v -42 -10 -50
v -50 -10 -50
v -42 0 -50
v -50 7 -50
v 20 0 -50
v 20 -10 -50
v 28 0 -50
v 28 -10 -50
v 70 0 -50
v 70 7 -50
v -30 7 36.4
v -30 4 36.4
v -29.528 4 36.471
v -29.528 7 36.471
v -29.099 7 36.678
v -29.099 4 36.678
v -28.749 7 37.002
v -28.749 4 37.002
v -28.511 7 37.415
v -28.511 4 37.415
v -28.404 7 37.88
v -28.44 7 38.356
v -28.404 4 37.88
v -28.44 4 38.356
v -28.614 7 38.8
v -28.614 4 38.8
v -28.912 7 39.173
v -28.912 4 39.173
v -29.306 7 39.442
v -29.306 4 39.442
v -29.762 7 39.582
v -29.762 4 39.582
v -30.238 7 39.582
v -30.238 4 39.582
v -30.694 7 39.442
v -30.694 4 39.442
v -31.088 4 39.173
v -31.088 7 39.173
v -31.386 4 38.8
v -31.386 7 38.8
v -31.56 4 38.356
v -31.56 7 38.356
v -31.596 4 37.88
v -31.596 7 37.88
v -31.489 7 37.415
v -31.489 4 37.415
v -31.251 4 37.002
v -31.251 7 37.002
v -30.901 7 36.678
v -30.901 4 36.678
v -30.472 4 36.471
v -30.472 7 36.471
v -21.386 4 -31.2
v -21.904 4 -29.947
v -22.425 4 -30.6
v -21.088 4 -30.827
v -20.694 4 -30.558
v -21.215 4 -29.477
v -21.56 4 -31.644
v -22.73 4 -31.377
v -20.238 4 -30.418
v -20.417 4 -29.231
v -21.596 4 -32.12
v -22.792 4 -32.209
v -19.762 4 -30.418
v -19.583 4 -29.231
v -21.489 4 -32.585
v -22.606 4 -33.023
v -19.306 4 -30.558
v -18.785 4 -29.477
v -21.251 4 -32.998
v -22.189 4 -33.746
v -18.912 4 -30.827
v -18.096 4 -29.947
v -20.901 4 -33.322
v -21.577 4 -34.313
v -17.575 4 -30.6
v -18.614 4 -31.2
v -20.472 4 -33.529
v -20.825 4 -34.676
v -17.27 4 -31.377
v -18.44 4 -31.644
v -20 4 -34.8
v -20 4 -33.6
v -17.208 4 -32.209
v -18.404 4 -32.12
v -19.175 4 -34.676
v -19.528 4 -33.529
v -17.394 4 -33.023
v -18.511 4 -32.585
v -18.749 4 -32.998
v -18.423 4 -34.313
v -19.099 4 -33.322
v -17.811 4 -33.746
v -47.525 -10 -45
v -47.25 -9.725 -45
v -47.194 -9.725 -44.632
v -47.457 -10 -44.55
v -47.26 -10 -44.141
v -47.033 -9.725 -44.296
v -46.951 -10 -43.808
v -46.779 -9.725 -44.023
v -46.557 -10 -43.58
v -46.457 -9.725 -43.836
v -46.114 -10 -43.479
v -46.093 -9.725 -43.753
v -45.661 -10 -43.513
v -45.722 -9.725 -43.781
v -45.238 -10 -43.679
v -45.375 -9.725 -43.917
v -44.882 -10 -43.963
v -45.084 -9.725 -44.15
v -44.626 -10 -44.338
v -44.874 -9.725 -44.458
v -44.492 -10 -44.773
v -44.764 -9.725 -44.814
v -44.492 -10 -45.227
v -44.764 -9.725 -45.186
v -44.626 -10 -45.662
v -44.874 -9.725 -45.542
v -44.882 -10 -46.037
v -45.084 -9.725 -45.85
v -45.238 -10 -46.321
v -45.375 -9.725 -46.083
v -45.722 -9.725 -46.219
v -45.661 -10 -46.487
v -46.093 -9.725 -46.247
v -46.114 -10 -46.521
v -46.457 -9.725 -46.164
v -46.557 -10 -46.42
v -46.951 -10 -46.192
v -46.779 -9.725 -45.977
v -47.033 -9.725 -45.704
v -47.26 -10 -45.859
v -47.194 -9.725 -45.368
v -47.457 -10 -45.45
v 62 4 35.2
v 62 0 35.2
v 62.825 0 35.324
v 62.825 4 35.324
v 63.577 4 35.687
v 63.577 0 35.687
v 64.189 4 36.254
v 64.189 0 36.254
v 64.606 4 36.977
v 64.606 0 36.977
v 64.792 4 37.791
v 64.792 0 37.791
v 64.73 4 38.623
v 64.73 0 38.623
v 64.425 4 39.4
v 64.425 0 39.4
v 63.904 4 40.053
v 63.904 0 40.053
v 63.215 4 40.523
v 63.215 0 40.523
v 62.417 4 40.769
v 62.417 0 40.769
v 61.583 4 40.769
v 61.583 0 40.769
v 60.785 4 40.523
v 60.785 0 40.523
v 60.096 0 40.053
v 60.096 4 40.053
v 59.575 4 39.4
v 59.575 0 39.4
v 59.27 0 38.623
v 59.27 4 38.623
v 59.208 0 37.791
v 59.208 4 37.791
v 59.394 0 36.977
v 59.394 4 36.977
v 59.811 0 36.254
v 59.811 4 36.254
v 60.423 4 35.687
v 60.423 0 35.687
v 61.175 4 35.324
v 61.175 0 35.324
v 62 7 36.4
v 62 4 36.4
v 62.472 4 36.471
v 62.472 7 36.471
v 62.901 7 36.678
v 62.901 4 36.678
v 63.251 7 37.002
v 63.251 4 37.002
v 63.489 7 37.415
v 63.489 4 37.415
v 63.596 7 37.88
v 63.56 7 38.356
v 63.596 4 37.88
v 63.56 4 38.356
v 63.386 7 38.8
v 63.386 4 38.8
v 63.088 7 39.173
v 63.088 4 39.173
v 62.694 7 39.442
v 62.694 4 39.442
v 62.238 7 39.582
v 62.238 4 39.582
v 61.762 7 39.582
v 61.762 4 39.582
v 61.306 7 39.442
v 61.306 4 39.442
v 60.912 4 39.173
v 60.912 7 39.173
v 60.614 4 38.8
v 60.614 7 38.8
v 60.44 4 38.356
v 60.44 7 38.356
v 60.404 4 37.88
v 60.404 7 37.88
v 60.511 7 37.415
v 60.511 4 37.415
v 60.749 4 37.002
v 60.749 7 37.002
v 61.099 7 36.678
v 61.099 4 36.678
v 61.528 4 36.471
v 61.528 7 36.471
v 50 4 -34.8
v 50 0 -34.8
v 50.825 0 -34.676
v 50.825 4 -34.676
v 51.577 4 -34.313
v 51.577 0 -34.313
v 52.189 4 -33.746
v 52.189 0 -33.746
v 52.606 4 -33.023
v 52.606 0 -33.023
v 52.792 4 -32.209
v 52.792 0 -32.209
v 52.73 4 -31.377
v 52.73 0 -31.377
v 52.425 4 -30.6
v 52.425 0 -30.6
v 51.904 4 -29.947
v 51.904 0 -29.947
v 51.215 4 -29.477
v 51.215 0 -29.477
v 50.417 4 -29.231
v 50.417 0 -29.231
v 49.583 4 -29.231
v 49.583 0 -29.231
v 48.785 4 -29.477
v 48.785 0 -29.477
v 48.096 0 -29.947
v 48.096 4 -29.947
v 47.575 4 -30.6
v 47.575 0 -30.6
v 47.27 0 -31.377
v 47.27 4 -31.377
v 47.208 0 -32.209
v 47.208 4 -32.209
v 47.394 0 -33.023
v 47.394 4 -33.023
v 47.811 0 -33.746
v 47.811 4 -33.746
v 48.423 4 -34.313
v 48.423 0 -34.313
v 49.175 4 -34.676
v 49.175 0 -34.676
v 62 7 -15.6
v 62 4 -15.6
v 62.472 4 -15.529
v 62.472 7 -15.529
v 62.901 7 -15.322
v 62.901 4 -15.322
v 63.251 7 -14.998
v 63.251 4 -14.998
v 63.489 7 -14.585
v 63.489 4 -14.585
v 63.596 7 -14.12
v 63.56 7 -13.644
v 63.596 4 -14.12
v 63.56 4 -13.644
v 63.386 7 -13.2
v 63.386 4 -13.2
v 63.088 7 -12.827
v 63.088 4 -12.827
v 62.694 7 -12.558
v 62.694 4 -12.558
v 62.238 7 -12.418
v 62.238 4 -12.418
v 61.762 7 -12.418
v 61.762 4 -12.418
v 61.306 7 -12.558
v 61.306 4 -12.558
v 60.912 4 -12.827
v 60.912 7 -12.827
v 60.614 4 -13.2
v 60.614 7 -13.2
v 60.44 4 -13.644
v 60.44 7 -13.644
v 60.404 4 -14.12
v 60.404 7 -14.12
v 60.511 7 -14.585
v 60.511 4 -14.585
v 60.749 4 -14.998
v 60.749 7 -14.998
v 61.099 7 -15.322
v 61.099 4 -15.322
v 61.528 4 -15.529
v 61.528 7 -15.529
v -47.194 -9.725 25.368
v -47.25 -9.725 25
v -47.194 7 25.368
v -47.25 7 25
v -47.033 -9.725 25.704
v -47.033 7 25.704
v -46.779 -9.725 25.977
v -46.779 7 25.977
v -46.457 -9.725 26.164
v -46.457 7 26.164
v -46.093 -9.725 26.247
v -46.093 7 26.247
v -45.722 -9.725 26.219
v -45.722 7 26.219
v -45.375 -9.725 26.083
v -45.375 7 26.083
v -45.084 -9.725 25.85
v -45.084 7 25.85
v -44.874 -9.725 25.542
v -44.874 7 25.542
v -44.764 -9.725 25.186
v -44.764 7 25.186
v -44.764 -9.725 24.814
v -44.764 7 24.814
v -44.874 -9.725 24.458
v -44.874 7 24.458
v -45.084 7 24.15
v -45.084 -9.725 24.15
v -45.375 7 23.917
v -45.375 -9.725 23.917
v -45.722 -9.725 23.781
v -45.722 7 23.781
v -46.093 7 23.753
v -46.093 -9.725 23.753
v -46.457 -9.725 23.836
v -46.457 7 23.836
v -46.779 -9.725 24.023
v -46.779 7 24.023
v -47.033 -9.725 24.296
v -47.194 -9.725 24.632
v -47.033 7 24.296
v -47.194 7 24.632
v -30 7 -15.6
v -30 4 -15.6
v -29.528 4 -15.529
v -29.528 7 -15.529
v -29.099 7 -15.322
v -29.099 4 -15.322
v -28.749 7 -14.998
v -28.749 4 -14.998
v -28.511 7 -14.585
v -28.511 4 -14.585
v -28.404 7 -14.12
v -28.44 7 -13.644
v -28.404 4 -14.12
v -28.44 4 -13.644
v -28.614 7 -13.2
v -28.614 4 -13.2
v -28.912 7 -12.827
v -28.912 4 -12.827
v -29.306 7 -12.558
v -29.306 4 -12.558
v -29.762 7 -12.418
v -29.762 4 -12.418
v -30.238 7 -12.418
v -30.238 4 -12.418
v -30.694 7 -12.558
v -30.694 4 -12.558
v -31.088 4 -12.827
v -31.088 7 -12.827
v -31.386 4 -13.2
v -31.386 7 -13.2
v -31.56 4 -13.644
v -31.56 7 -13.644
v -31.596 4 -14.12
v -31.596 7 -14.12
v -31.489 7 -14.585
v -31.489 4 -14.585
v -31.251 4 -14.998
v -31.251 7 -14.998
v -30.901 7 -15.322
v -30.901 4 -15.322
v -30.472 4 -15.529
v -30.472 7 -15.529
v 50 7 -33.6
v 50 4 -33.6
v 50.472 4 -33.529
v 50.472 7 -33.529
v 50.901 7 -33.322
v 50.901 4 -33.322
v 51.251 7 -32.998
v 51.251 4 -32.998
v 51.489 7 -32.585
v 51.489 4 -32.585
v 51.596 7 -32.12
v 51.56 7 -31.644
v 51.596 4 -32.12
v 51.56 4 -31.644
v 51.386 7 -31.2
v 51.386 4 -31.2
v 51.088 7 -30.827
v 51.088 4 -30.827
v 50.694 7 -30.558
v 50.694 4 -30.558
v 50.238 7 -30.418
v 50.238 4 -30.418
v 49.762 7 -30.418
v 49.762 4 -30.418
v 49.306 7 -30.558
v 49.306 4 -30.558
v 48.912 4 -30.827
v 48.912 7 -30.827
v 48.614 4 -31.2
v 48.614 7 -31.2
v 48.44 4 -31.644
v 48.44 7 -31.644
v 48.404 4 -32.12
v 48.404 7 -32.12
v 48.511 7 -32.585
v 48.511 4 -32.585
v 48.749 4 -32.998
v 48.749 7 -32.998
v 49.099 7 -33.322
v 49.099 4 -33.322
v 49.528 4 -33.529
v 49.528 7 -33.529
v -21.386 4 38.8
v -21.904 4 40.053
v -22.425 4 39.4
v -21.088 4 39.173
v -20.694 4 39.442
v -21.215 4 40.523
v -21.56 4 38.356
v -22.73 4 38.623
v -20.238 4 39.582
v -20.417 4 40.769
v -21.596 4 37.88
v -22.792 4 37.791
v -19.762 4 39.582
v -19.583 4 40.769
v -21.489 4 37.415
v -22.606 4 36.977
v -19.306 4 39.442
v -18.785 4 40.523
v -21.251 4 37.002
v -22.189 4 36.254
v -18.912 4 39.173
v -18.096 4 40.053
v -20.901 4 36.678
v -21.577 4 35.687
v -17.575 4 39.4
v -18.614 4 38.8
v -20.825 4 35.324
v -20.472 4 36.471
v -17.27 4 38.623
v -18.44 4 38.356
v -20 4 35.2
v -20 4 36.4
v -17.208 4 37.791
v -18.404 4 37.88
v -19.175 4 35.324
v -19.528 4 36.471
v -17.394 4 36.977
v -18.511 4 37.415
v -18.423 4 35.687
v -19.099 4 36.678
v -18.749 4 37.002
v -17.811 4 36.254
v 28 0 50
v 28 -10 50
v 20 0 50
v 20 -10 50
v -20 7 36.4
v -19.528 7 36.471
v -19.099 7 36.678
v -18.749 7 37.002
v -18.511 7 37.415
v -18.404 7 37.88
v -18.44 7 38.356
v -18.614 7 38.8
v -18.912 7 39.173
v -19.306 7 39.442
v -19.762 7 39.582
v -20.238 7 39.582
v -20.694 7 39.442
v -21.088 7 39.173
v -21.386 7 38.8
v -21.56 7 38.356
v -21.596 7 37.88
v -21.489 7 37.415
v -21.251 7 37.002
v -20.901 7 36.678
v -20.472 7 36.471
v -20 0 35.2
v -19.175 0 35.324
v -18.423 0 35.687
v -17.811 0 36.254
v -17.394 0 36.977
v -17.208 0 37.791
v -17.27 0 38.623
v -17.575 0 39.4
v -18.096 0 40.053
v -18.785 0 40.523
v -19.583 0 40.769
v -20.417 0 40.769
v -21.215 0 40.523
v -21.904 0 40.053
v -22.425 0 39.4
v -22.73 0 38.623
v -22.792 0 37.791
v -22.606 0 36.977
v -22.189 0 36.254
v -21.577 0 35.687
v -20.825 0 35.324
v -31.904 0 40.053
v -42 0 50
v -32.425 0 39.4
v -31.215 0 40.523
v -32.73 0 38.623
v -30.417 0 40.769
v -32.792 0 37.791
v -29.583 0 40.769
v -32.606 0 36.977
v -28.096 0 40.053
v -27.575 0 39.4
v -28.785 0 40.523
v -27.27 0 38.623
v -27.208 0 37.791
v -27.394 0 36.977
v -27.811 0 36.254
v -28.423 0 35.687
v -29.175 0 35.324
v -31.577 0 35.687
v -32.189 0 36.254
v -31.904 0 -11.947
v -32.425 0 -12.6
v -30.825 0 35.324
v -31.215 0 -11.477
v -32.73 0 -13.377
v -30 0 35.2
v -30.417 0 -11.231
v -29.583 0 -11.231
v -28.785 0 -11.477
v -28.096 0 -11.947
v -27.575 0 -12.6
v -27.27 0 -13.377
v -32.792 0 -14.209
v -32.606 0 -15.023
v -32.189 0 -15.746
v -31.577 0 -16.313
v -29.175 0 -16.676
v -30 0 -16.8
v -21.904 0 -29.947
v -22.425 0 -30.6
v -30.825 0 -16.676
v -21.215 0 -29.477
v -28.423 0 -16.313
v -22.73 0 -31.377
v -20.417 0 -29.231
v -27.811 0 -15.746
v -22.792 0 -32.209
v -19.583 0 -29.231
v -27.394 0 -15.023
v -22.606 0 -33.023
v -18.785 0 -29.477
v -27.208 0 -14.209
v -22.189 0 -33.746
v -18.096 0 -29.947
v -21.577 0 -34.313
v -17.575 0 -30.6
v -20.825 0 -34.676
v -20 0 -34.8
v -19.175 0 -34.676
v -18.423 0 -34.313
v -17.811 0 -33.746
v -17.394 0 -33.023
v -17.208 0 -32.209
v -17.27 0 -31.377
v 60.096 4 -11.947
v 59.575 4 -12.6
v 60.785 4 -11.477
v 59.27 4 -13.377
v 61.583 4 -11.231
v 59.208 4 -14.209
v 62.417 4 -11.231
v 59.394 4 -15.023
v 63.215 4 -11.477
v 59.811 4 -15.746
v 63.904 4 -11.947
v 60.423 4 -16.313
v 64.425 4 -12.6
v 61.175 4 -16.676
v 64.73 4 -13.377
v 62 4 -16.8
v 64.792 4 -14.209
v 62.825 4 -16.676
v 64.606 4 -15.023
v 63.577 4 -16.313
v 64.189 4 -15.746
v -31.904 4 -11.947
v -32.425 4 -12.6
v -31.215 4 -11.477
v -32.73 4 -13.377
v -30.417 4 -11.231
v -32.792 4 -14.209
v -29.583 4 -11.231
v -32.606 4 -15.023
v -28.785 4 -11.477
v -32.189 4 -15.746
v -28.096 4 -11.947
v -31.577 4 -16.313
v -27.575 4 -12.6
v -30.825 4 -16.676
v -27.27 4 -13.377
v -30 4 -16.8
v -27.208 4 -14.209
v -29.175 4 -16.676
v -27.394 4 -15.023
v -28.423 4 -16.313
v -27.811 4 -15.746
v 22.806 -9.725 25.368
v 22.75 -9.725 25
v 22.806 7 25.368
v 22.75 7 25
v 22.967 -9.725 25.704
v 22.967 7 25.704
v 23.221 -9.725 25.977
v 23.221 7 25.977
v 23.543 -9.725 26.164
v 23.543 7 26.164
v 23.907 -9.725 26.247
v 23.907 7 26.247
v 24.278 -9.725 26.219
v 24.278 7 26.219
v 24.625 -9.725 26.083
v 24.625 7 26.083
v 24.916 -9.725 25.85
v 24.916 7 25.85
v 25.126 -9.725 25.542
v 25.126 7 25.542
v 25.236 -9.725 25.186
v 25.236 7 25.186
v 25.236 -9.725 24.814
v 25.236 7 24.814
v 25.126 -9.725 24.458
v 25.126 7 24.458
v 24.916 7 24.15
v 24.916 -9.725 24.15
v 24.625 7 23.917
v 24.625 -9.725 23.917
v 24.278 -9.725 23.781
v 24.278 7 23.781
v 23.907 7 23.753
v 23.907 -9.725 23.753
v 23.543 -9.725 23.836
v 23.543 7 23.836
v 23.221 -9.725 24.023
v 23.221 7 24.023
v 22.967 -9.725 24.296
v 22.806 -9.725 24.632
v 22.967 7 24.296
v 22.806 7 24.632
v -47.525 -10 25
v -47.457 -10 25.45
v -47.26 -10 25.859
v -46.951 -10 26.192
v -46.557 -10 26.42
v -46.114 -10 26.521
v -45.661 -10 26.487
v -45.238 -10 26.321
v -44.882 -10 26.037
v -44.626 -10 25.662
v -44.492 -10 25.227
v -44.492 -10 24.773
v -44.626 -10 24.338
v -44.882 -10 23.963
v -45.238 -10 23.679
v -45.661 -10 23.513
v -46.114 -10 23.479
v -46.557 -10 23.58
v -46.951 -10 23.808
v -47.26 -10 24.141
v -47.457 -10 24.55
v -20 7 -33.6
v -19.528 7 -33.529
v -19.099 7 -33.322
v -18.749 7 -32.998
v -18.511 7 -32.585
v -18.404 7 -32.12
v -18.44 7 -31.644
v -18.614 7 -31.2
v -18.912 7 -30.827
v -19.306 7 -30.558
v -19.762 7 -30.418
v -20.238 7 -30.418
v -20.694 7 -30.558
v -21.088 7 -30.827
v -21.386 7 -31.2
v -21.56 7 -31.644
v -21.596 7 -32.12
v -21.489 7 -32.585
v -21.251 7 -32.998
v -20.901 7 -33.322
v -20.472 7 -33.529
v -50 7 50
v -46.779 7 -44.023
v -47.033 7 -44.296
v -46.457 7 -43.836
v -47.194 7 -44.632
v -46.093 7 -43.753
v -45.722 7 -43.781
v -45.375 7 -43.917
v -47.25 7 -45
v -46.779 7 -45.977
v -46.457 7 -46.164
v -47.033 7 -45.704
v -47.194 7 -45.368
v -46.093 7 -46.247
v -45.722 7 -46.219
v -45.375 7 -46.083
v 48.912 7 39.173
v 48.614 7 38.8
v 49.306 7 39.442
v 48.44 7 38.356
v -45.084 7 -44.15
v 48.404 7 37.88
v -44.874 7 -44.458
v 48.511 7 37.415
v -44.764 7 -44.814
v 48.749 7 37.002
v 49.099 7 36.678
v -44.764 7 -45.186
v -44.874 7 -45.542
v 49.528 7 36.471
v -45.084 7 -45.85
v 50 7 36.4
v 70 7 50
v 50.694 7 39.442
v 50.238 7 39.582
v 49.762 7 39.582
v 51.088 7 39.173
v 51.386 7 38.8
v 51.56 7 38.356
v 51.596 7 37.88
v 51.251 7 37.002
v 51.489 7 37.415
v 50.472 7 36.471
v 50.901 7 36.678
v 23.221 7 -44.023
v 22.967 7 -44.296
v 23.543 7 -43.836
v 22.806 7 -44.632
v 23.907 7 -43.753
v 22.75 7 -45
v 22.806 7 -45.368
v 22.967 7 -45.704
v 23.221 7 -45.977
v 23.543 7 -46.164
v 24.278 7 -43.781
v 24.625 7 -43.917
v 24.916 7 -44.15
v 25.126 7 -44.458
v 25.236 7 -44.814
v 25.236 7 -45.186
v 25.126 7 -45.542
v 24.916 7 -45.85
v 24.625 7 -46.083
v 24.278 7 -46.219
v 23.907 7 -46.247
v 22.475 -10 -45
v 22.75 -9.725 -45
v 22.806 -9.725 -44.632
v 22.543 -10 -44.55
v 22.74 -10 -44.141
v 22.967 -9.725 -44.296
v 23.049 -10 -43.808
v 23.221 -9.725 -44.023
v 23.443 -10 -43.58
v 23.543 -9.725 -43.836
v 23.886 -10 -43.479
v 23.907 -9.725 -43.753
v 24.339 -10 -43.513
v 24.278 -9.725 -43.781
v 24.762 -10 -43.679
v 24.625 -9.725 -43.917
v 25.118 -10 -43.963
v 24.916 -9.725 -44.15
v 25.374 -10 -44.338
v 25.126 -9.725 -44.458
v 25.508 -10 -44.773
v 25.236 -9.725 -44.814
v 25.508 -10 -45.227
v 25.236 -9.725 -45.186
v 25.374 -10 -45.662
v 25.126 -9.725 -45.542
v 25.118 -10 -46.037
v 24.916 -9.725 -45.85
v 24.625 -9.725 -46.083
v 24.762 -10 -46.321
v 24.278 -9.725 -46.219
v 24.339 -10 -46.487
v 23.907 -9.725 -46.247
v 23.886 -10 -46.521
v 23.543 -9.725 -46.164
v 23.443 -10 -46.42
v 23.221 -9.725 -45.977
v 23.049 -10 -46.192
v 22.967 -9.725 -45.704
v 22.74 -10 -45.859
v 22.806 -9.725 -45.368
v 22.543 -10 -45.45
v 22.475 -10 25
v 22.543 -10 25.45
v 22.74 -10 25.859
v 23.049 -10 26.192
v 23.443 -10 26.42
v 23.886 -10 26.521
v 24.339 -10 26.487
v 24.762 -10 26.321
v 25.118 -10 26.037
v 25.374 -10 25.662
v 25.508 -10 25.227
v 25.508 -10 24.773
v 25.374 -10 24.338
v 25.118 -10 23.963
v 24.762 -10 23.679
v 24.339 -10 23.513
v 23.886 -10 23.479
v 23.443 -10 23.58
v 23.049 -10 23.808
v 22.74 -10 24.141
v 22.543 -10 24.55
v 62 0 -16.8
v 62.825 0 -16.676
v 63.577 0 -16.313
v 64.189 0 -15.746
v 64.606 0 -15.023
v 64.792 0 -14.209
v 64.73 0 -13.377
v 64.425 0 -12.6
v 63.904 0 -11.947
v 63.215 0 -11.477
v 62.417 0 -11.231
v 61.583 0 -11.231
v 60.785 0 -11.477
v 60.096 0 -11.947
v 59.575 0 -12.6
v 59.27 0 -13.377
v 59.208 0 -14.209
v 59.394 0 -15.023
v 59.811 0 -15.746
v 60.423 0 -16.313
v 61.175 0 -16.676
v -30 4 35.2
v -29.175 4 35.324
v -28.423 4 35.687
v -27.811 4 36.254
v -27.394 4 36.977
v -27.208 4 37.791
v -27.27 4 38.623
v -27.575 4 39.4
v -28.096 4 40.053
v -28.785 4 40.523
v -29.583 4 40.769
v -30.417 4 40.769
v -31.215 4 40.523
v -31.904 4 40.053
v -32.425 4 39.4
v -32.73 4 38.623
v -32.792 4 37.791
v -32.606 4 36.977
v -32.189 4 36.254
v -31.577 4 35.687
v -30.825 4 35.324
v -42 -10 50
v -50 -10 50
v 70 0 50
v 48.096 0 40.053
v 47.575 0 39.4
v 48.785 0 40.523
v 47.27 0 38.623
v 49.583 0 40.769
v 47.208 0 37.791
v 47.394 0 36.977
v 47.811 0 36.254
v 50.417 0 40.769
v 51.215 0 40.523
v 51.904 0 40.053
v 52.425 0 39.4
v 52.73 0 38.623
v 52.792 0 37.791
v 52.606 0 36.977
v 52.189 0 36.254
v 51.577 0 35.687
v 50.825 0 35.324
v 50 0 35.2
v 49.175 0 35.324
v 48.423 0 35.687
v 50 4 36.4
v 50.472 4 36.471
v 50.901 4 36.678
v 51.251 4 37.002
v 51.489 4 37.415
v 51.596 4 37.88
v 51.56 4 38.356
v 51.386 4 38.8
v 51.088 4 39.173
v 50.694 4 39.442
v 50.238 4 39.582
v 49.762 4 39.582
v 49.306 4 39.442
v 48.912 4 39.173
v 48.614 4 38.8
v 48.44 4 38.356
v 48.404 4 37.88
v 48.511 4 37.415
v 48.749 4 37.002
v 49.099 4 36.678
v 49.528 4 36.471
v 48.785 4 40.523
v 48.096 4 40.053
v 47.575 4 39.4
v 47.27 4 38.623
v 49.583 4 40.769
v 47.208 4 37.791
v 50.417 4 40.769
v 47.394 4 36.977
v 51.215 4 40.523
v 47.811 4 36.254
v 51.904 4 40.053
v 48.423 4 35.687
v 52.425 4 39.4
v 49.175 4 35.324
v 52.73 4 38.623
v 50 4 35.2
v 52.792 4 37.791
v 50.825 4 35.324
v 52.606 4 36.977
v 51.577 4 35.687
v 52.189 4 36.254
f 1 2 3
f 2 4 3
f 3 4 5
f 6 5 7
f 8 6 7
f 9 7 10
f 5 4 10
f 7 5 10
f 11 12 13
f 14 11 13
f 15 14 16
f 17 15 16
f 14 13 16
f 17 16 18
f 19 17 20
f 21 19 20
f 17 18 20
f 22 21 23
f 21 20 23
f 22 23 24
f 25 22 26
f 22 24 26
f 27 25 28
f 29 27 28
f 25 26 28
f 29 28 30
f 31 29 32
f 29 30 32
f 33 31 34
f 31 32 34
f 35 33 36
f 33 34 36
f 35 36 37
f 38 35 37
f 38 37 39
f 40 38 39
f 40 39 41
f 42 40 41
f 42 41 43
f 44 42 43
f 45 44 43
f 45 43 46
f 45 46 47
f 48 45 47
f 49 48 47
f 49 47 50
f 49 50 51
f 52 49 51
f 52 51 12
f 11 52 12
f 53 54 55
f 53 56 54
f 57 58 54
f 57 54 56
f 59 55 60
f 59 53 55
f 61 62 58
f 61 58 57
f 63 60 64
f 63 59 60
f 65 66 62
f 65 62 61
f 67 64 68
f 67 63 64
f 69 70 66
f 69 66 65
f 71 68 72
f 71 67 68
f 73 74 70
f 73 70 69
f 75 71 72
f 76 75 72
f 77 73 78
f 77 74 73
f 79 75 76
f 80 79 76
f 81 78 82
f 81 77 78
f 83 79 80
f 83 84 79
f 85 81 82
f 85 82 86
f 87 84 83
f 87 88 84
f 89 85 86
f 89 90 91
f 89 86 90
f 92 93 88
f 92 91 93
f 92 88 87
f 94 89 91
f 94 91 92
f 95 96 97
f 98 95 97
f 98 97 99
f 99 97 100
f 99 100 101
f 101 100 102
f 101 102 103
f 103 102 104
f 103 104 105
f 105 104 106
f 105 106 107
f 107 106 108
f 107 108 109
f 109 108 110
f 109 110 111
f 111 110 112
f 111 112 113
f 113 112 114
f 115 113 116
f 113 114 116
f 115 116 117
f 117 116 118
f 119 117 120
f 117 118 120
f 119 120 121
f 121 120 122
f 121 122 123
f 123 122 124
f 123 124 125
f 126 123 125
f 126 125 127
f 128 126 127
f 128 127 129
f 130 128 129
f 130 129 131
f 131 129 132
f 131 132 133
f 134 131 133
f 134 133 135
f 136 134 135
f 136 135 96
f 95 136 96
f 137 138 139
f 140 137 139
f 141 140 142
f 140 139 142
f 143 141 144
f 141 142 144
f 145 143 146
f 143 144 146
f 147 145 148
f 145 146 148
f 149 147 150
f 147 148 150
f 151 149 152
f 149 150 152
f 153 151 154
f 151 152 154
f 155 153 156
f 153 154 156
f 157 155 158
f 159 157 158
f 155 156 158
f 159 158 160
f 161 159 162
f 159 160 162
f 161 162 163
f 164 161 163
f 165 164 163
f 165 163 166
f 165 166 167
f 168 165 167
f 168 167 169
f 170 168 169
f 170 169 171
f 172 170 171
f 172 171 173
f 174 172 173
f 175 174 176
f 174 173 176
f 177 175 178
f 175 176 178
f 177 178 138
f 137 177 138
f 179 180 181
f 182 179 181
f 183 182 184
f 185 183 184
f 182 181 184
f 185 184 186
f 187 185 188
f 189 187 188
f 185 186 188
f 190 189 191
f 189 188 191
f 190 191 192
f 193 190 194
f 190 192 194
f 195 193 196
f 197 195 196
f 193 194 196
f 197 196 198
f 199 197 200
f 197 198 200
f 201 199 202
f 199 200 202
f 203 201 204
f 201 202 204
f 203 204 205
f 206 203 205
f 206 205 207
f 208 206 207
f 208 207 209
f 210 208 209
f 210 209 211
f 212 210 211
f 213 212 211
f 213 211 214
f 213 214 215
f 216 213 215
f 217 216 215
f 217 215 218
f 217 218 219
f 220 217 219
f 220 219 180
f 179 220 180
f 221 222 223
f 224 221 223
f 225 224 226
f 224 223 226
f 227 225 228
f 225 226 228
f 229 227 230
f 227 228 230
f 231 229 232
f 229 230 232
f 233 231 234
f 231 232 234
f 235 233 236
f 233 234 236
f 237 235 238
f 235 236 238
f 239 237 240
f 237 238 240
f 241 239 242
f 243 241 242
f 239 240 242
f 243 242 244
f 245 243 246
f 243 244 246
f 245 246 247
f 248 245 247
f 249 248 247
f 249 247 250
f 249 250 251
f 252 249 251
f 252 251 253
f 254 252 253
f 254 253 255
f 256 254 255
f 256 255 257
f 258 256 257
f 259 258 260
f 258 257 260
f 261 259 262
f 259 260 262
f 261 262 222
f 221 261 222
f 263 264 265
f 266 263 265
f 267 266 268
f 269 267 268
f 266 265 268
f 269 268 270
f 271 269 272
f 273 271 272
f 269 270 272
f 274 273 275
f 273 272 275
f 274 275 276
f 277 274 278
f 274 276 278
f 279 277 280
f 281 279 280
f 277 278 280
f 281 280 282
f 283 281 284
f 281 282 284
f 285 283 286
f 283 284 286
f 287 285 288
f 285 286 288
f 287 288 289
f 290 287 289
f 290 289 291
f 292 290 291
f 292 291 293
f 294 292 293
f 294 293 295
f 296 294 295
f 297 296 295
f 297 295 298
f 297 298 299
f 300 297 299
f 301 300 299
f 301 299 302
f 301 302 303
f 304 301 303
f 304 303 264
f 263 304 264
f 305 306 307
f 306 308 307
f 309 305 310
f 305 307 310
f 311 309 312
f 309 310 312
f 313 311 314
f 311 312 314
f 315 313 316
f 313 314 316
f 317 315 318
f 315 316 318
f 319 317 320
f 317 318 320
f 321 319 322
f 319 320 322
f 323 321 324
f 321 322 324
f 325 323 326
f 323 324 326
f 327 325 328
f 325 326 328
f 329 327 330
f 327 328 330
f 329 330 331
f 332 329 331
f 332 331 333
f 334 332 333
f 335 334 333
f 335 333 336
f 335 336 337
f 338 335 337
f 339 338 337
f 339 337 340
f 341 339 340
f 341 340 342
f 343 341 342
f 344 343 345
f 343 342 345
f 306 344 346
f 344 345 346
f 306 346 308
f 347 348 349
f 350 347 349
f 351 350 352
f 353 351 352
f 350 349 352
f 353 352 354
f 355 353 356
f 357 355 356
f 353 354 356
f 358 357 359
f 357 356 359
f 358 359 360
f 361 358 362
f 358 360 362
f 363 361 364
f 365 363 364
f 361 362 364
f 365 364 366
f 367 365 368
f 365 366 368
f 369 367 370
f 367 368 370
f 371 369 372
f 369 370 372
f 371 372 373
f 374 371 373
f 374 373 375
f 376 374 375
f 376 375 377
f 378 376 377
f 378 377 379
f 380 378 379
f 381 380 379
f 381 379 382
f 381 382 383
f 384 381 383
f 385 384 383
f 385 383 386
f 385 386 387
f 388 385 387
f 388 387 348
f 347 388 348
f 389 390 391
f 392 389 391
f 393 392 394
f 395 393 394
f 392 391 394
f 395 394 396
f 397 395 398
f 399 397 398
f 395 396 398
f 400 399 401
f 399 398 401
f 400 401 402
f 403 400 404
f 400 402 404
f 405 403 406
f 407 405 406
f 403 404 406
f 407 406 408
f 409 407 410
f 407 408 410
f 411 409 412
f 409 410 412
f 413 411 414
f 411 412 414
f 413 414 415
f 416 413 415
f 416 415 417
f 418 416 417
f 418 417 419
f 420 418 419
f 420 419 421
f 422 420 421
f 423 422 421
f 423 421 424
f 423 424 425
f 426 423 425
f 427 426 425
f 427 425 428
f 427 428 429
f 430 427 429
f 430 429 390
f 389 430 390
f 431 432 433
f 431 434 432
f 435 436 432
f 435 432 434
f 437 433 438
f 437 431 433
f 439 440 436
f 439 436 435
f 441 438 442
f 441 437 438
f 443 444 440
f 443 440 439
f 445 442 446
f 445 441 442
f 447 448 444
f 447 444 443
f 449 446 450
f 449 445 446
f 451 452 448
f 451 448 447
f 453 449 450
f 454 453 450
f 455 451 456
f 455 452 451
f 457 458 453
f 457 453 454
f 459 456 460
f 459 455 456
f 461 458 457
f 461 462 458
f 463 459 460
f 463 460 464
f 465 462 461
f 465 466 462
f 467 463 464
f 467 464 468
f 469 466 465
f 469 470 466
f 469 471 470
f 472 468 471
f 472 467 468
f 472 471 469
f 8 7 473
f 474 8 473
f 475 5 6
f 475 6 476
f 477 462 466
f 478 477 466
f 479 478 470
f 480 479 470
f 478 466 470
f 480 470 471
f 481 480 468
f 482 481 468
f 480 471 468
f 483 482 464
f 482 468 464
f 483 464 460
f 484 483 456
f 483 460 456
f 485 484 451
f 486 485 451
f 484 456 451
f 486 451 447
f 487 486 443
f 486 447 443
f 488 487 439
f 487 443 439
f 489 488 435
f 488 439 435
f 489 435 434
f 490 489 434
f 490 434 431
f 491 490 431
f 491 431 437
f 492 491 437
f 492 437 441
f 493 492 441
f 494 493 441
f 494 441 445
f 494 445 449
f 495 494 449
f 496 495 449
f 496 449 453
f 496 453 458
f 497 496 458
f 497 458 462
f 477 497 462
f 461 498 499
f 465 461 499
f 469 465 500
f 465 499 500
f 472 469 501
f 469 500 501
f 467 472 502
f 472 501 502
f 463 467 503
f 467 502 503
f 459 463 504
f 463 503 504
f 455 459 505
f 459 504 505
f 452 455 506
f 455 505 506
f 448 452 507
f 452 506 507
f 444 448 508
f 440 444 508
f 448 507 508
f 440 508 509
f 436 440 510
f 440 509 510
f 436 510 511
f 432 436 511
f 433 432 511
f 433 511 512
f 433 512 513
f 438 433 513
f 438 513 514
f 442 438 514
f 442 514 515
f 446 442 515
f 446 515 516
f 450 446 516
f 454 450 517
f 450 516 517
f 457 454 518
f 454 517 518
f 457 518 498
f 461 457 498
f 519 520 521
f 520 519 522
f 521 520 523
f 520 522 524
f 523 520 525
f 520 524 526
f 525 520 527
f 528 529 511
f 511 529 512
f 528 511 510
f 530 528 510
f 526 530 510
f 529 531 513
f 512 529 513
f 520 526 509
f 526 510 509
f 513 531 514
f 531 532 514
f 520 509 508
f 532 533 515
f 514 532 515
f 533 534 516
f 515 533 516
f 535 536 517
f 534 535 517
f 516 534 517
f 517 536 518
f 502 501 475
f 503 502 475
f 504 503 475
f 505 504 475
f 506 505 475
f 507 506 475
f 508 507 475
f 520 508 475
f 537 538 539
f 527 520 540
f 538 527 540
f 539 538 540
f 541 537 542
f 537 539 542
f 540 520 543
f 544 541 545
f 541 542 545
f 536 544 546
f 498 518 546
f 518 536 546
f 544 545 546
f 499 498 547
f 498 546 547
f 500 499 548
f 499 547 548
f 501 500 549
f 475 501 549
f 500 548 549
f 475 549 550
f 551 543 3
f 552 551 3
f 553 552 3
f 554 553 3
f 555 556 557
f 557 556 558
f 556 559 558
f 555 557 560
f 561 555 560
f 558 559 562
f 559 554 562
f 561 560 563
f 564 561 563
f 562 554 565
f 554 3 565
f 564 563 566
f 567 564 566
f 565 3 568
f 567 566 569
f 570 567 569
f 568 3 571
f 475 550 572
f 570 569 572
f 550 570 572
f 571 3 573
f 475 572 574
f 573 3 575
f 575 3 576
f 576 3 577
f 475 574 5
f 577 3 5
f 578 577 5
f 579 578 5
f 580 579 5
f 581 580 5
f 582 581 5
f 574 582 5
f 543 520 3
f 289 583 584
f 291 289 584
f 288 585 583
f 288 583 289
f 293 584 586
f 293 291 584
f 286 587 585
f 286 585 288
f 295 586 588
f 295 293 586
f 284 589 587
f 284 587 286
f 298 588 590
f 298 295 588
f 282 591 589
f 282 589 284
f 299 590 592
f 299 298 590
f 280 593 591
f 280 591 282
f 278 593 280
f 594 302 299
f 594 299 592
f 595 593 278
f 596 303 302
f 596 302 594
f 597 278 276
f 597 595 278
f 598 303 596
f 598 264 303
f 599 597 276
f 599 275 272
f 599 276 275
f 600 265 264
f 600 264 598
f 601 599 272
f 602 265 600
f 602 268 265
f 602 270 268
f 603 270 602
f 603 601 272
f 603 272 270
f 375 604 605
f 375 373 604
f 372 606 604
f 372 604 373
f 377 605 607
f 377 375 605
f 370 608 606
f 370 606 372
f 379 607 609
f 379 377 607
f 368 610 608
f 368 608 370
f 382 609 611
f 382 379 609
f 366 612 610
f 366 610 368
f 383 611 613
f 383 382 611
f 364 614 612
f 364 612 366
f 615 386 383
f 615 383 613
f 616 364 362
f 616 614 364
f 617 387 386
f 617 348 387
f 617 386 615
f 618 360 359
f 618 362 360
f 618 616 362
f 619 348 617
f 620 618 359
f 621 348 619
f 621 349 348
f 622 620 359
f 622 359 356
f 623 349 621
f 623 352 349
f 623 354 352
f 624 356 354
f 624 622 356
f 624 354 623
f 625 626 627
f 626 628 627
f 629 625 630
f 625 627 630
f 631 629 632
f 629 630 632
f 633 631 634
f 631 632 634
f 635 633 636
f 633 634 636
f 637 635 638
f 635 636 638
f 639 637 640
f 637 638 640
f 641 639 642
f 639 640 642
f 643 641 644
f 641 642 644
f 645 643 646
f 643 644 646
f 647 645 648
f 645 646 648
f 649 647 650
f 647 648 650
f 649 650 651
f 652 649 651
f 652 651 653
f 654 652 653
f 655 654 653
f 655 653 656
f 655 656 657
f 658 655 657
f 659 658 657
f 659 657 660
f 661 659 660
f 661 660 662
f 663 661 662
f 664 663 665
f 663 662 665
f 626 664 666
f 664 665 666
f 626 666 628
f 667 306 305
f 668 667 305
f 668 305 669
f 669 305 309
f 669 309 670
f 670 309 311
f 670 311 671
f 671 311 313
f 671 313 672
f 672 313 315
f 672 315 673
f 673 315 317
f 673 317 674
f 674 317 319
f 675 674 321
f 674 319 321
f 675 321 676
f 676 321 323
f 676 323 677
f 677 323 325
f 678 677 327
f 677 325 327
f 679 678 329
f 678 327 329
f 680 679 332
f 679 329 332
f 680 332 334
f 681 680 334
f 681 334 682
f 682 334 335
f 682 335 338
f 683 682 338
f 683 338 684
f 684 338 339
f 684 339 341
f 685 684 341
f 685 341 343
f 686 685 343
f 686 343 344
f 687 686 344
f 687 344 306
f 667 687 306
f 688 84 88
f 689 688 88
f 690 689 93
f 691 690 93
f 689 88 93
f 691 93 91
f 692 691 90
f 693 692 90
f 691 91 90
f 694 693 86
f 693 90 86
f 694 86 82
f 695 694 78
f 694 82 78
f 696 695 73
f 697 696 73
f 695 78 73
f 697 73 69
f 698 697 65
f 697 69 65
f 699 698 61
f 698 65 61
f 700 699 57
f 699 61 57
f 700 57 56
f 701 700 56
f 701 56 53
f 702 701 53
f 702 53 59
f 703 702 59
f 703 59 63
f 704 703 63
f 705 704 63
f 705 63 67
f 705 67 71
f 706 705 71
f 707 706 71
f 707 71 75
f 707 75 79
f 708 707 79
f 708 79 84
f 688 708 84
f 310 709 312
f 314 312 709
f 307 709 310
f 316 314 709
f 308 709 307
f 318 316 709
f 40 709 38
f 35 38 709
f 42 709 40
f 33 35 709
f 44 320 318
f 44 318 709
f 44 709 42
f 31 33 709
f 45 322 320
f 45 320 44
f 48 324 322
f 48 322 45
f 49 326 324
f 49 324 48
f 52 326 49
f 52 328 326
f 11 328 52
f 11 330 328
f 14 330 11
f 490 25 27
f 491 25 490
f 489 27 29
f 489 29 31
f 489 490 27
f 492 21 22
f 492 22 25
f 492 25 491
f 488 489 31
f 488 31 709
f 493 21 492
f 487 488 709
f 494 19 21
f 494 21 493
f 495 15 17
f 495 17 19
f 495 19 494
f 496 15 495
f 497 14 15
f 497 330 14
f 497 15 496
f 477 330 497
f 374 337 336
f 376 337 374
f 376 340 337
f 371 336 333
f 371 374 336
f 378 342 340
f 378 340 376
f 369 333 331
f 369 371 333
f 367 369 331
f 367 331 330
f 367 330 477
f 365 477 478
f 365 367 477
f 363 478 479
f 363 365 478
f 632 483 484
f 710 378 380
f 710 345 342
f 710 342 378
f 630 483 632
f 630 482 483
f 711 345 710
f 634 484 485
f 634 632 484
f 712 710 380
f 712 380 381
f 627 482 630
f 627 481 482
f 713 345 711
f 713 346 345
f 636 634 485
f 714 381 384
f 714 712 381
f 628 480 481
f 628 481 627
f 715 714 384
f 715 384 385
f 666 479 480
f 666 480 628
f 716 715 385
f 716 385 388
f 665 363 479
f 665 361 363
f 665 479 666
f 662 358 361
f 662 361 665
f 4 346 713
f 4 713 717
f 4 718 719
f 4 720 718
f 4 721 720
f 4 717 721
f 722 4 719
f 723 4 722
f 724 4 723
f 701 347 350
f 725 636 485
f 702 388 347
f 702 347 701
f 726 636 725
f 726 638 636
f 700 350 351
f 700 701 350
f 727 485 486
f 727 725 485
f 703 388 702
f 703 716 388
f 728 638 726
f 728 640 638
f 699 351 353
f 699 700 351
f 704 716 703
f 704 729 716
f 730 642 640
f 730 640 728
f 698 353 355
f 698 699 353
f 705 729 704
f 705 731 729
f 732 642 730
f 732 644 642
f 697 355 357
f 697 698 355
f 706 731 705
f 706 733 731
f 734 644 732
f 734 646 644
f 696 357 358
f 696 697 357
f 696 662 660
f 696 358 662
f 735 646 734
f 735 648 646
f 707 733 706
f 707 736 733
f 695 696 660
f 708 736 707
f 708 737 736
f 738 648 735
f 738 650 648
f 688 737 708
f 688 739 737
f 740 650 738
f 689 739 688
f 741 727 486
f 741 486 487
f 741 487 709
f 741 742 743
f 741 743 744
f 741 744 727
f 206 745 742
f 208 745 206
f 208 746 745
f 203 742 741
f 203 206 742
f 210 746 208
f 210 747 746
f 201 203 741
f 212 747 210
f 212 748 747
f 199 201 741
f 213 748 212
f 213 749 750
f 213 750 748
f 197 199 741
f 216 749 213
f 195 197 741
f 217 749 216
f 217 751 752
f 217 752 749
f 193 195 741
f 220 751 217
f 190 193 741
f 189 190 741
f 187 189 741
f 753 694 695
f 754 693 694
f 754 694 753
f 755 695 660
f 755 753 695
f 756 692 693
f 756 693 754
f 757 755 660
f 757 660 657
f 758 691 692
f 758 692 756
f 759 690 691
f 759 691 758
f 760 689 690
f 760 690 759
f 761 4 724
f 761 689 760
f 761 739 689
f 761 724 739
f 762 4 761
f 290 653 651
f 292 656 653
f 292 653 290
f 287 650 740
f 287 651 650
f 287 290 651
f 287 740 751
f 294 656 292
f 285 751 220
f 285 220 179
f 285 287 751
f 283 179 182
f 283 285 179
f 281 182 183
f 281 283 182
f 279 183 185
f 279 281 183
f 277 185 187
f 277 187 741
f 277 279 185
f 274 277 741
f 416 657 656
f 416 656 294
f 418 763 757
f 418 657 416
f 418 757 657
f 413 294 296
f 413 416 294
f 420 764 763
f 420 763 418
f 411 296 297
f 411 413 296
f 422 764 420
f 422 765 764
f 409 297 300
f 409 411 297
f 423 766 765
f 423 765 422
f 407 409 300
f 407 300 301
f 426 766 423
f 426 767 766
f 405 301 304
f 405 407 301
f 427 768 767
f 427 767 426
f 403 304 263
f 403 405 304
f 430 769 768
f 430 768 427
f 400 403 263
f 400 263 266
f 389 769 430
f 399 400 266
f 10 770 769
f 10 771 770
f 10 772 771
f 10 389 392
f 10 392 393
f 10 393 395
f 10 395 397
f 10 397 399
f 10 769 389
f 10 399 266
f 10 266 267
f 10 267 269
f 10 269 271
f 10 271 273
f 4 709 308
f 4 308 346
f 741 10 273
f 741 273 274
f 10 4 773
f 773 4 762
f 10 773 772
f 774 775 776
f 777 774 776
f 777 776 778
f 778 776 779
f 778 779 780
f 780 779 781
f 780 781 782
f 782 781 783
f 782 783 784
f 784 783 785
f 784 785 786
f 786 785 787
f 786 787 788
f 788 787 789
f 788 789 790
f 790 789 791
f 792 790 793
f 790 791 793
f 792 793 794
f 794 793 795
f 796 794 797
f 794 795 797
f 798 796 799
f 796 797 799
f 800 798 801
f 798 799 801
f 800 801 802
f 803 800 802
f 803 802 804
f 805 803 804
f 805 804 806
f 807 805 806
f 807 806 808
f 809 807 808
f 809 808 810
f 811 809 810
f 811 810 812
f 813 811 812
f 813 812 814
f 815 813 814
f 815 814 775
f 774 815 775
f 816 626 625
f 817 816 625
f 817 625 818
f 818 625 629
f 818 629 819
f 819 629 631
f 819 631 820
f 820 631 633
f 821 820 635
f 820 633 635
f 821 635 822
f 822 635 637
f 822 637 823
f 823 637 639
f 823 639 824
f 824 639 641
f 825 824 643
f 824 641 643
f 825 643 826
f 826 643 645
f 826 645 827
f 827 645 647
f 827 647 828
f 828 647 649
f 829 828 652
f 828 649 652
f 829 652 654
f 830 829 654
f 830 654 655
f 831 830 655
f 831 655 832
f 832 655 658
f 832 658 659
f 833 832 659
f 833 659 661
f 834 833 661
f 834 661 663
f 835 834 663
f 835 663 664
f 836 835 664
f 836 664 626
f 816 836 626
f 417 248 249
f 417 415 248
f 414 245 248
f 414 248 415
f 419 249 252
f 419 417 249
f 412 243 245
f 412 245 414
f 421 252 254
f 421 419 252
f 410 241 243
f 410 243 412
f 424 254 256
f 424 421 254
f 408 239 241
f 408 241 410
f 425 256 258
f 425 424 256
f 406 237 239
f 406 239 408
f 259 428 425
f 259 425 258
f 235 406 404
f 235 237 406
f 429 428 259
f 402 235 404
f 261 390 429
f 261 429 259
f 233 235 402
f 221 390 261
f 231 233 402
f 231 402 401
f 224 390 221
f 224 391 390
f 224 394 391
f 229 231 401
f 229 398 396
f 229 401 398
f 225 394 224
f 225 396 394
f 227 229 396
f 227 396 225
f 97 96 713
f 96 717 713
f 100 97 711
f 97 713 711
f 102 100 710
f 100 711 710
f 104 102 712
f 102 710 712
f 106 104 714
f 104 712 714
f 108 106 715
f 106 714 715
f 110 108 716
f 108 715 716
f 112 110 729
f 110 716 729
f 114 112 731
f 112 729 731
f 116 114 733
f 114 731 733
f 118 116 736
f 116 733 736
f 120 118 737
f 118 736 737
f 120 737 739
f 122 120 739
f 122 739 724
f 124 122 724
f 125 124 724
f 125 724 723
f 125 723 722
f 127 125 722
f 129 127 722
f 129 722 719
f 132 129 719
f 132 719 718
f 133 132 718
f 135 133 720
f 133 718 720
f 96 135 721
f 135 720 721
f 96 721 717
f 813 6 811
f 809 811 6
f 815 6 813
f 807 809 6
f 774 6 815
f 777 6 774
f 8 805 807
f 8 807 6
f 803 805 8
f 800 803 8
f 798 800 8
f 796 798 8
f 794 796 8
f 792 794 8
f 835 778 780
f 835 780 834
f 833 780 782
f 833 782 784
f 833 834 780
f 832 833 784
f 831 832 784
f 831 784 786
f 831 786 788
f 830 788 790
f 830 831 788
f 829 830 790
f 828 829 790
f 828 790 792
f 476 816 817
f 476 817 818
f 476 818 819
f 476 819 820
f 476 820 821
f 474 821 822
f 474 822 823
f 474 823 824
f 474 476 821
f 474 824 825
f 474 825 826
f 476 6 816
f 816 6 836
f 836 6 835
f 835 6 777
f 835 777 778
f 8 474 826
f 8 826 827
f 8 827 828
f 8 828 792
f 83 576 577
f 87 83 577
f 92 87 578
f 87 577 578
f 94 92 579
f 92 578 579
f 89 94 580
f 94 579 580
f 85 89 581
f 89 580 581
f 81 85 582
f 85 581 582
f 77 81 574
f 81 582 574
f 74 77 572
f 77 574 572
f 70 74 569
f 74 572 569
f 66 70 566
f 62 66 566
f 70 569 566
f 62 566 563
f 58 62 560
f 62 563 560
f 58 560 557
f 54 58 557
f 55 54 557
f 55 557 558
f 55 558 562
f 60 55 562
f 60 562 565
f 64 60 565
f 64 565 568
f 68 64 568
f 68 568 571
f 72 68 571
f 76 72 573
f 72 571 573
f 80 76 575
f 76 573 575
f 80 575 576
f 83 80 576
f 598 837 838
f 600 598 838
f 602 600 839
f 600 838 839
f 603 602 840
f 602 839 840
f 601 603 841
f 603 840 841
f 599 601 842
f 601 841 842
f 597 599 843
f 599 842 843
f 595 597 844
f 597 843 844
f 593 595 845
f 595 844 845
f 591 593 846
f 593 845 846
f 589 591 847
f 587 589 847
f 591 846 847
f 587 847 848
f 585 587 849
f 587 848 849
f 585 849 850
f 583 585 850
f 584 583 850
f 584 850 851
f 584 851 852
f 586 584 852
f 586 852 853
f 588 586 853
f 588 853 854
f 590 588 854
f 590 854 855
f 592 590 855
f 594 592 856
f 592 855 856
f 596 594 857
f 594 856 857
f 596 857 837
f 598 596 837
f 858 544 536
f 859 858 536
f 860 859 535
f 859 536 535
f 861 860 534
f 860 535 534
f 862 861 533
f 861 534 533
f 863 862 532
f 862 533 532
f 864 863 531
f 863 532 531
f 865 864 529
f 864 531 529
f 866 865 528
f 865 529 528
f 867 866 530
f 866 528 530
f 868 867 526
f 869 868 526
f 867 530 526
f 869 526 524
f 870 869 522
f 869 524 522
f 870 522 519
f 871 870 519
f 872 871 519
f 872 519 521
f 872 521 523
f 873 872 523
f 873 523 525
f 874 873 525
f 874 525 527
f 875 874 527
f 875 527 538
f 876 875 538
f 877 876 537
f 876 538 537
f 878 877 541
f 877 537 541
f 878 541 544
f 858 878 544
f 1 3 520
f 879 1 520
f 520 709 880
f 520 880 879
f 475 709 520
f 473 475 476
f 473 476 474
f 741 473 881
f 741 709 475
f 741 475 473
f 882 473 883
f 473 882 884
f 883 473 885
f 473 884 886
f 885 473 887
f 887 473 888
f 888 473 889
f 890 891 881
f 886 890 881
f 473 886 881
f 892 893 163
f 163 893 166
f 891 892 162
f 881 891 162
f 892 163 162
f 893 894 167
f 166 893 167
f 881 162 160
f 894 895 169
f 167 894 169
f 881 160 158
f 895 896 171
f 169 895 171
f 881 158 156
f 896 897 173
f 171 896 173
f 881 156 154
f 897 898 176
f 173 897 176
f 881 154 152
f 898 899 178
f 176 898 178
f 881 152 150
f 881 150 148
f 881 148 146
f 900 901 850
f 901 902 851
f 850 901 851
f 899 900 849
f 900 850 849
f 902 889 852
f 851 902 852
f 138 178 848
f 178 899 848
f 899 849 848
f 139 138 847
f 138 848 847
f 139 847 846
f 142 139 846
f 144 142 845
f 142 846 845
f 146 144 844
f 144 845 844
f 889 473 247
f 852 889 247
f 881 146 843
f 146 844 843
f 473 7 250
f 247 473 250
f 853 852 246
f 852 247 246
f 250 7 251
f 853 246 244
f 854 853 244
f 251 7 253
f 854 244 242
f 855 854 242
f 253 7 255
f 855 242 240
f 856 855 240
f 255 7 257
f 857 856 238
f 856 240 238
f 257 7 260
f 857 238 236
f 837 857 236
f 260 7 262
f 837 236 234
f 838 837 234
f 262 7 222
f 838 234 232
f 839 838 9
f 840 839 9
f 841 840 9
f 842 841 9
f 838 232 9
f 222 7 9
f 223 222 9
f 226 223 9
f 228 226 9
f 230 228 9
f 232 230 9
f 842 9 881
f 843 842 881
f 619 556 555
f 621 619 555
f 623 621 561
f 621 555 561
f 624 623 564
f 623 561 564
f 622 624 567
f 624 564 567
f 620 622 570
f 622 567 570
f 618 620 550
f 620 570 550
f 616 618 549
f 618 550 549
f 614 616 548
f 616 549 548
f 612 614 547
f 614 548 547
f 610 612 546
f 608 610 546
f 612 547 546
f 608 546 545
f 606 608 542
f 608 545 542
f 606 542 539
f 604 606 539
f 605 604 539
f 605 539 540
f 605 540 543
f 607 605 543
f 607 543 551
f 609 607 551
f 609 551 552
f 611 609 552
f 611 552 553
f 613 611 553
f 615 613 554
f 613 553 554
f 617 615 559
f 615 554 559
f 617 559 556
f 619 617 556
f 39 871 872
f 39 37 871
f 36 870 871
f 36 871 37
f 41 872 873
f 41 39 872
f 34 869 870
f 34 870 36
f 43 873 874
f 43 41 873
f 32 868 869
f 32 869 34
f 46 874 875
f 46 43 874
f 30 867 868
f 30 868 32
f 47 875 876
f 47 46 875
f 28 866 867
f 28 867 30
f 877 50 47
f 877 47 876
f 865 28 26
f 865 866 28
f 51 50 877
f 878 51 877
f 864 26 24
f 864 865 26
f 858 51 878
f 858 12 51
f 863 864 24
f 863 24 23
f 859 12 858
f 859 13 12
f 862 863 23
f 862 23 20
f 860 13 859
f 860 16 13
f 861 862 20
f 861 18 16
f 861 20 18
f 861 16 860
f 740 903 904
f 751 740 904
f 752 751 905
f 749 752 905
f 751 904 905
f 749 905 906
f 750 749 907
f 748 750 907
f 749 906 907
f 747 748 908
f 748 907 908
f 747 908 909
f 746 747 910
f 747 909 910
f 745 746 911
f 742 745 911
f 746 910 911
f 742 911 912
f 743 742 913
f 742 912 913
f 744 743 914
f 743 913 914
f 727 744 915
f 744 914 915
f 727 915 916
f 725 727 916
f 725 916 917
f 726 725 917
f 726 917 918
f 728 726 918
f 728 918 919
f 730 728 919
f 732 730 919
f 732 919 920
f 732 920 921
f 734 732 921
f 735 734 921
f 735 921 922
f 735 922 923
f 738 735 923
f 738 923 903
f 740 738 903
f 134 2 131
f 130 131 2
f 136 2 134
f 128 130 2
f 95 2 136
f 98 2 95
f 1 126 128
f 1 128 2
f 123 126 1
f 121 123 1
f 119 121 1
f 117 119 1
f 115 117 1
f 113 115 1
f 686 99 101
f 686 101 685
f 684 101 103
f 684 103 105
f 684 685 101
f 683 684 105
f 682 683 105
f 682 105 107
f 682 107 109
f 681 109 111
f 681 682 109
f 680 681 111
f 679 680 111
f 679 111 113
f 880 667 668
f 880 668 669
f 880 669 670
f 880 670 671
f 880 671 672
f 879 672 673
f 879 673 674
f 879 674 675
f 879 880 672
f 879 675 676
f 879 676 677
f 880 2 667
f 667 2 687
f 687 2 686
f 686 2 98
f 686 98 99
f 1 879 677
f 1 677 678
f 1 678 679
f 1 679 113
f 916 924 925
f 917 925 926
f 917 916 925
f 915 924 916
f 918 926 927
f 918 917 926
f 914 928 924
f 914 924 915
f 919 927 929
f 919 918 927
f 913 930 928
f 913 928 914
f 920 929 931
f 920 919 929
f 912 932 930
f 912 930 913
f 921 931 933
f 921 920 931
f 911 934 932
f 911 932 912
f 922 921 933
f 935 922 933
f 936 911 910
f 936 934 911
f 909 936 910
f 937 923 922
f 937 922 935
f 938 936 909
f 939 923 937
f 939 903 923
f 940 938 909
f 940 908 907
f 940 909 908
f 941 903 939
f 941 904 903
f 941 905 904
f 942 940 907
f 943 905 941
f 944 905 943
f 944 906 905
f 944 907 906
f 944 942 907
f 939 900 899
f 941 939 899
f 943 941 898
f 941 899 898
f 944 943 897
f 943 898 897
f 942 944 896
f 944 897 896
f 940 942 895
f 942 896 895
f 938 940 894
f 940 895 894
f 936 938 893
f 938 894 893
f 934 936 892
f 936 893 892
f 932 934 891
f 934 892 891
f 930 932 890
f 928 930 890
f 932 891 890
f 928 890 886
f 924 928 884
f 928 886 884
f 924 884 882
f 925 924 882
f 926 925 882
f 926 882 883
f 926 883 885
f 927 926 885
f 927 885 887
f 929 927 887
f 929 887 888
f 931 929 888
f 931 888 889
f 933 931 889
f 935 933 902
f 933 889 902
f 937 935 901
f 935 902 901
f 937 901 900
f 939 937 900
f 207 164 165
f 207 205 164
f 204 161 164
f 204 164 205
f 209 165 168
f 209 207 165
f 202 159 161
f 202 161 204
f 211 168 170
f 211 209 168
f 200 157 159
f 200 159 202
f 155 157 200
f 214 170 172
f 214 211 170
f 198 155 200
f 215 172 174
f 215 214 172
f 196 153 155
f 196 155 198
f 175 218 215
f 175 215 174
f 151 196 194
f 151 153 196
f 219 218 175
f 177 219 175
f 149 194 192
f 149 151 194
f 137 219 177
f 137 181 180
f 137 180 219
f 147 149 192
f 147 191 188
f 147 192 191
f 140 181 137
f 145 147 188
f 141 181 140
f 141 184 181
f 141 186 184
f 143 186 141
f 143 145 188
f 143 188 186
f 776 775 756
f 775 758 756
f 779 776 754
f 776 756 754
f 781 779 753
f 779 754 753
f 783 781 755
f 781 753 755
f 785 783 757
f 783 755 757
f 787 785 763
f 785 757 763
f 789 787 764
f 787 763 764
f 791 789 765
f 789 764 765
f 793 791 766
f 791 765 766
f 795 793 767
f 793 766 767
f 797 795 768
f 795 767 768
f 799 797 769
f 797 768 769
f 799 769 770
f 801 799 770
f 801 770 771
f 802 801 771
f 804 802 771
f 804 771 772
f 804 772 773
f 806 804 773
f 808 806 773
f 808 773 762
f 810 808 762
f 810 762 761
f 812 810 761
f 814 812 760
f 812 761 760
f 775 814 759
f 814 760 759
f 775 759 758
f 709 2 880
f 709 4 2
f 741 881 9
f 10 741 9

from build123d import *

# Parameters (mm, degrees)
SKETCH_1_W                   = 120
SKETCH_1_H                   = 100
EXTRUDE_1_DEPTH              = 7
SKETCH_2_R                   = 2.8
CUT_EXTRUDE_1_DEPTH          = 4
CUT_EXTRUDE_2_REACH          = 88.116
SKETCH_3_R                   = 1.6
SKETCH_4_W                   = 8
SKETCH_4_H                   = 100
EXTRUDE_2_DEPTH              = 10
HOLE_WIZARD_M3_5_D           = 2.5
HOLE_WIZARD_M3_5_CSINK_D     = 3.05
HOLE_WIZARD_M3_5_CSINK_ANGLE = 90


with BuildPart() as part:
    # 草图1 → 凸台-拉伸1 (new body)
    with BuildSketch(Plane(origin=(0, 0, 0), x_dir=(1, 0, 0), z_dir=(0, 1, 0))):
        with Locations((10, 0)):
            Rectangle(SKETCH_1_W, SKETCH_1_H)
    extrude(amount=EXTRUDE_1_DEPTH)

    # 草图2 → 切除-拉伸1 (cut)
    with BuildSketch(Plane.XZ):
        with Locations(Location((62, 38, 0), (0, 0, 270))):
            Circle(SKETCH_2_R)
        with Locations(Location((-30, 38, 0), (0, 0, 270))):
            Circle(SKETCH_2_R)
        with Locations(Location((-30, -14, 0), (0, 0, 270))):
            Circle(SKETCH_2_R)
        with Locations(Location((62, -14, 0), (0, 0, 270))):
            Circle(SKETCH_2_R)
        with Locations(Location((-20, 38, 0), (0, 0, 270))):
            Circle(SKETCH_2_R)
        with Locations(Location((50, 38, 0), (0, 0, 270))):
            Circle(SKETCH_2_R)
        with Locations(Location((50, -32, 0), (0, 0, 270))):
            Circle(SKETCH_2_R)
        with Locations(Location((-20, -32, 0), (0, 0, 270))):
            Circle(SKETCH_2_R)
    extrude(amount=-CUT_EXTRUDE_1_DEPTH, mode=Mode.SUBTRACT)

    # 草图3 → 切除-拉伸2 (cut, up to next)
    with BuildSketch(Plane.XZ.offset(-4), mode=Mode.PRIVATE) as cut_extrude_2_sk1:
        with Locations(Location((62, 38, 0), (0, 0, 270))):
            Circle(SKETCH_3_R)
    cut_extrude_2_tool1 = extrude(cut_extrude_2_sk1.sketch, amount=-CUT_EXTRUDE_2_REACH, mode=Mode.PRIVATE) & part.part
    # 草图3 → 切除-拉伸2 (cut, up to next)
    with BuildSketch(Plane.XZ.offset(-4), mode=Mode.PRIVATE) as cut_extrude_2_sk2:
        with Locations(Location((-30, 38, 0), (0, 0, 270))):
            Circle(SKETCH_3_R)
    cut_extrude_2_tool2 = extrude(cut_extrude_2_sk2.sketch, amount=-CUT_EXTRUDE_2_REACH, mode=Mode.PRIVATE) & part.part
    # 草图3 → 切除-拉伸2 (cut, up to next)
    with BuildSketch(Plane.XZ.offset(-4), mode=Mode.PRIVATE) as cut_extrude_2_sk3:
        with Locations(Location((-30, -14, 0), (0, 0, 270))):
            Circle(SKETCH_3_R)
    cut_extrude_2_tool3 = extrude(cut_extrude_2_sk3.sketch, amount=-CUT_EXTRUDE_2_REACH, mode=Mode.PRIVATE) & part.part
    # 草图3 → 切除-拉伸2 (cut, up to next)
    with BuildSketch(Plane.XZ.offset(-4), mode=Mode.PRIVATE) as cut_extrude_2_sk4:
        with Locations(Location((62, -14, 0), (0, 0, 270))):
            Circle(SKETCH_3_R)
    cut_extrude_2_tool4 = extrude(cut_extrude_2_sk4.sketch, amount=-CUT_EXTRUDE_2_REACH, mode=Mode.PRIVATE) & part.part
    # 草图3 → 切除-拉伸2 (cut, up to next)
    with BuildSketch(Plane.XZ.offset(-4), mode=Mode.PRIVATE) as cut_extrude_2_sk5:
        with Locations(Location((-20, 38, 0), (0, 0, 270))):
            Circle(SKETCH_3_R)
    cut_extrude_2_tool5 = extrude(cut_extrude_2_sk5.sketch, amount=-CUT_EXTRUDE_2_REACH, mode=Mode.PRIVATE) & part.part
    # 草图3 → 切除-拉伸2 (cut, up to next)
    with BuildSketch(Plane.XZ.offset(-4), mode=Mode.PRIVATE) as cut_extrude_2_sk6:
        with Locations(Location((50, 38, 0), (0, 0, 270))):
            Circle(SKETCH_3_R)
    cut_extrude_2_tool6 = extrude(cut_extrude_2_sk6.sketch, amount=-CUT_EXTRUDE_2_REACH, mode=Mode.PRIVATE) & part.part
    # 草图3 → 切除-拉伸2 (cut, up to next)
    with BuildSketch(Plane.XZ.offset(-4), mode=Mode.PRIVATE) as cut_extrude_2_sk7:
        with Locations(Location((50, -32, 0), (0, 0, 270))):
            Circle(SKETCH_3_R)
    cut_extrude_2_tool7 = extrude(cut_extrude_2_sk7.sketch, amount=-CUT_EXTRUDE_2_REACH, mode=Mode.PRIVATE) & part.part
    # 草图3 → 切除-拉伸2 (cut, up to next)
    with BuildSketch(Plane.XZ.offset(-4), mode=Mode.PRIVATE) as cut_extrude_2_sk8:
        with Locations(Location((-20, -32, 0), (0, 0, 270))):
            Circle(SKETCH_3_R)
    cut_extrude_2_tool8 = extrude(cut_extrude_2_sk8.sketch, amount=-CUT_EXTRUDE_2_REACH, mode=Mode.PRIVATE) & part.part
    add(cut_extrude_2_tool1.solids().sort_by_distance((62, 4, 38))[0], mode=Mode.SUBTRACT)
    add(cut_extrude_2_tool2.solids().sort_by_distance((-30, 4, 38))[0], mode=Mode.SUBTRACT)
    add(cut_extrude_2_tool3.solids().sort_by_distance((-30, 4, -14))[0], mode=Mode.SUBTRACT)
    add(cut_extrude_2_tool4.solids().sort_by_distance((62, 4, -14))[0], mode=Mode.SUBTRACT)
    add(cut_extrude_2_tool5.solids().sort_by_distance((-20, 4, 38))[0], mode=Mode.SUBTRACT)
    add(cut_extrude_2_tool6.solids().sort_by_distance((50, 4, 38))[0], mode=Mode.SUBTRACT)
    add(cut_extrude_2_tool7.solids().sort_by_distance((50, 4, -32))[0], mode=Mode.SUBTRACT)
    add(cut_extrude_2_tool8.solids().sort_by_distance((-20, 4, -32))[0], mode=Mode.SUBTRACT)

    # 草图4 → 凸台-拉伸2 (add)
    with BuildSketch(Plane.XZ):
        with Locations((-46, 0)):
            Rectangle(SKETCH_4_W, SKETCH_4_H)
        with Locations((24, 0)):
            Rectangle(SKETCH_4_W, SKETCH_4_H)
    extrude(amount=EXTRUDE_2_DEPTH)

    # M3 螺纹孔5 (through all)
    with Locations(Plane.XZ.offset(10)):
        with Locations((-46, -45), (24, -45), (24, 25), (-46, 25)):
            CounterSinkHole(HOLE_WIZARD_M3_5_D / 2, HOLE_WIZARD_M3_5_CSINK_D / 2, counter_sink_angle=HOLE_WIZARD_M3_5_CSINK_ANGLE)


solid = part.part
